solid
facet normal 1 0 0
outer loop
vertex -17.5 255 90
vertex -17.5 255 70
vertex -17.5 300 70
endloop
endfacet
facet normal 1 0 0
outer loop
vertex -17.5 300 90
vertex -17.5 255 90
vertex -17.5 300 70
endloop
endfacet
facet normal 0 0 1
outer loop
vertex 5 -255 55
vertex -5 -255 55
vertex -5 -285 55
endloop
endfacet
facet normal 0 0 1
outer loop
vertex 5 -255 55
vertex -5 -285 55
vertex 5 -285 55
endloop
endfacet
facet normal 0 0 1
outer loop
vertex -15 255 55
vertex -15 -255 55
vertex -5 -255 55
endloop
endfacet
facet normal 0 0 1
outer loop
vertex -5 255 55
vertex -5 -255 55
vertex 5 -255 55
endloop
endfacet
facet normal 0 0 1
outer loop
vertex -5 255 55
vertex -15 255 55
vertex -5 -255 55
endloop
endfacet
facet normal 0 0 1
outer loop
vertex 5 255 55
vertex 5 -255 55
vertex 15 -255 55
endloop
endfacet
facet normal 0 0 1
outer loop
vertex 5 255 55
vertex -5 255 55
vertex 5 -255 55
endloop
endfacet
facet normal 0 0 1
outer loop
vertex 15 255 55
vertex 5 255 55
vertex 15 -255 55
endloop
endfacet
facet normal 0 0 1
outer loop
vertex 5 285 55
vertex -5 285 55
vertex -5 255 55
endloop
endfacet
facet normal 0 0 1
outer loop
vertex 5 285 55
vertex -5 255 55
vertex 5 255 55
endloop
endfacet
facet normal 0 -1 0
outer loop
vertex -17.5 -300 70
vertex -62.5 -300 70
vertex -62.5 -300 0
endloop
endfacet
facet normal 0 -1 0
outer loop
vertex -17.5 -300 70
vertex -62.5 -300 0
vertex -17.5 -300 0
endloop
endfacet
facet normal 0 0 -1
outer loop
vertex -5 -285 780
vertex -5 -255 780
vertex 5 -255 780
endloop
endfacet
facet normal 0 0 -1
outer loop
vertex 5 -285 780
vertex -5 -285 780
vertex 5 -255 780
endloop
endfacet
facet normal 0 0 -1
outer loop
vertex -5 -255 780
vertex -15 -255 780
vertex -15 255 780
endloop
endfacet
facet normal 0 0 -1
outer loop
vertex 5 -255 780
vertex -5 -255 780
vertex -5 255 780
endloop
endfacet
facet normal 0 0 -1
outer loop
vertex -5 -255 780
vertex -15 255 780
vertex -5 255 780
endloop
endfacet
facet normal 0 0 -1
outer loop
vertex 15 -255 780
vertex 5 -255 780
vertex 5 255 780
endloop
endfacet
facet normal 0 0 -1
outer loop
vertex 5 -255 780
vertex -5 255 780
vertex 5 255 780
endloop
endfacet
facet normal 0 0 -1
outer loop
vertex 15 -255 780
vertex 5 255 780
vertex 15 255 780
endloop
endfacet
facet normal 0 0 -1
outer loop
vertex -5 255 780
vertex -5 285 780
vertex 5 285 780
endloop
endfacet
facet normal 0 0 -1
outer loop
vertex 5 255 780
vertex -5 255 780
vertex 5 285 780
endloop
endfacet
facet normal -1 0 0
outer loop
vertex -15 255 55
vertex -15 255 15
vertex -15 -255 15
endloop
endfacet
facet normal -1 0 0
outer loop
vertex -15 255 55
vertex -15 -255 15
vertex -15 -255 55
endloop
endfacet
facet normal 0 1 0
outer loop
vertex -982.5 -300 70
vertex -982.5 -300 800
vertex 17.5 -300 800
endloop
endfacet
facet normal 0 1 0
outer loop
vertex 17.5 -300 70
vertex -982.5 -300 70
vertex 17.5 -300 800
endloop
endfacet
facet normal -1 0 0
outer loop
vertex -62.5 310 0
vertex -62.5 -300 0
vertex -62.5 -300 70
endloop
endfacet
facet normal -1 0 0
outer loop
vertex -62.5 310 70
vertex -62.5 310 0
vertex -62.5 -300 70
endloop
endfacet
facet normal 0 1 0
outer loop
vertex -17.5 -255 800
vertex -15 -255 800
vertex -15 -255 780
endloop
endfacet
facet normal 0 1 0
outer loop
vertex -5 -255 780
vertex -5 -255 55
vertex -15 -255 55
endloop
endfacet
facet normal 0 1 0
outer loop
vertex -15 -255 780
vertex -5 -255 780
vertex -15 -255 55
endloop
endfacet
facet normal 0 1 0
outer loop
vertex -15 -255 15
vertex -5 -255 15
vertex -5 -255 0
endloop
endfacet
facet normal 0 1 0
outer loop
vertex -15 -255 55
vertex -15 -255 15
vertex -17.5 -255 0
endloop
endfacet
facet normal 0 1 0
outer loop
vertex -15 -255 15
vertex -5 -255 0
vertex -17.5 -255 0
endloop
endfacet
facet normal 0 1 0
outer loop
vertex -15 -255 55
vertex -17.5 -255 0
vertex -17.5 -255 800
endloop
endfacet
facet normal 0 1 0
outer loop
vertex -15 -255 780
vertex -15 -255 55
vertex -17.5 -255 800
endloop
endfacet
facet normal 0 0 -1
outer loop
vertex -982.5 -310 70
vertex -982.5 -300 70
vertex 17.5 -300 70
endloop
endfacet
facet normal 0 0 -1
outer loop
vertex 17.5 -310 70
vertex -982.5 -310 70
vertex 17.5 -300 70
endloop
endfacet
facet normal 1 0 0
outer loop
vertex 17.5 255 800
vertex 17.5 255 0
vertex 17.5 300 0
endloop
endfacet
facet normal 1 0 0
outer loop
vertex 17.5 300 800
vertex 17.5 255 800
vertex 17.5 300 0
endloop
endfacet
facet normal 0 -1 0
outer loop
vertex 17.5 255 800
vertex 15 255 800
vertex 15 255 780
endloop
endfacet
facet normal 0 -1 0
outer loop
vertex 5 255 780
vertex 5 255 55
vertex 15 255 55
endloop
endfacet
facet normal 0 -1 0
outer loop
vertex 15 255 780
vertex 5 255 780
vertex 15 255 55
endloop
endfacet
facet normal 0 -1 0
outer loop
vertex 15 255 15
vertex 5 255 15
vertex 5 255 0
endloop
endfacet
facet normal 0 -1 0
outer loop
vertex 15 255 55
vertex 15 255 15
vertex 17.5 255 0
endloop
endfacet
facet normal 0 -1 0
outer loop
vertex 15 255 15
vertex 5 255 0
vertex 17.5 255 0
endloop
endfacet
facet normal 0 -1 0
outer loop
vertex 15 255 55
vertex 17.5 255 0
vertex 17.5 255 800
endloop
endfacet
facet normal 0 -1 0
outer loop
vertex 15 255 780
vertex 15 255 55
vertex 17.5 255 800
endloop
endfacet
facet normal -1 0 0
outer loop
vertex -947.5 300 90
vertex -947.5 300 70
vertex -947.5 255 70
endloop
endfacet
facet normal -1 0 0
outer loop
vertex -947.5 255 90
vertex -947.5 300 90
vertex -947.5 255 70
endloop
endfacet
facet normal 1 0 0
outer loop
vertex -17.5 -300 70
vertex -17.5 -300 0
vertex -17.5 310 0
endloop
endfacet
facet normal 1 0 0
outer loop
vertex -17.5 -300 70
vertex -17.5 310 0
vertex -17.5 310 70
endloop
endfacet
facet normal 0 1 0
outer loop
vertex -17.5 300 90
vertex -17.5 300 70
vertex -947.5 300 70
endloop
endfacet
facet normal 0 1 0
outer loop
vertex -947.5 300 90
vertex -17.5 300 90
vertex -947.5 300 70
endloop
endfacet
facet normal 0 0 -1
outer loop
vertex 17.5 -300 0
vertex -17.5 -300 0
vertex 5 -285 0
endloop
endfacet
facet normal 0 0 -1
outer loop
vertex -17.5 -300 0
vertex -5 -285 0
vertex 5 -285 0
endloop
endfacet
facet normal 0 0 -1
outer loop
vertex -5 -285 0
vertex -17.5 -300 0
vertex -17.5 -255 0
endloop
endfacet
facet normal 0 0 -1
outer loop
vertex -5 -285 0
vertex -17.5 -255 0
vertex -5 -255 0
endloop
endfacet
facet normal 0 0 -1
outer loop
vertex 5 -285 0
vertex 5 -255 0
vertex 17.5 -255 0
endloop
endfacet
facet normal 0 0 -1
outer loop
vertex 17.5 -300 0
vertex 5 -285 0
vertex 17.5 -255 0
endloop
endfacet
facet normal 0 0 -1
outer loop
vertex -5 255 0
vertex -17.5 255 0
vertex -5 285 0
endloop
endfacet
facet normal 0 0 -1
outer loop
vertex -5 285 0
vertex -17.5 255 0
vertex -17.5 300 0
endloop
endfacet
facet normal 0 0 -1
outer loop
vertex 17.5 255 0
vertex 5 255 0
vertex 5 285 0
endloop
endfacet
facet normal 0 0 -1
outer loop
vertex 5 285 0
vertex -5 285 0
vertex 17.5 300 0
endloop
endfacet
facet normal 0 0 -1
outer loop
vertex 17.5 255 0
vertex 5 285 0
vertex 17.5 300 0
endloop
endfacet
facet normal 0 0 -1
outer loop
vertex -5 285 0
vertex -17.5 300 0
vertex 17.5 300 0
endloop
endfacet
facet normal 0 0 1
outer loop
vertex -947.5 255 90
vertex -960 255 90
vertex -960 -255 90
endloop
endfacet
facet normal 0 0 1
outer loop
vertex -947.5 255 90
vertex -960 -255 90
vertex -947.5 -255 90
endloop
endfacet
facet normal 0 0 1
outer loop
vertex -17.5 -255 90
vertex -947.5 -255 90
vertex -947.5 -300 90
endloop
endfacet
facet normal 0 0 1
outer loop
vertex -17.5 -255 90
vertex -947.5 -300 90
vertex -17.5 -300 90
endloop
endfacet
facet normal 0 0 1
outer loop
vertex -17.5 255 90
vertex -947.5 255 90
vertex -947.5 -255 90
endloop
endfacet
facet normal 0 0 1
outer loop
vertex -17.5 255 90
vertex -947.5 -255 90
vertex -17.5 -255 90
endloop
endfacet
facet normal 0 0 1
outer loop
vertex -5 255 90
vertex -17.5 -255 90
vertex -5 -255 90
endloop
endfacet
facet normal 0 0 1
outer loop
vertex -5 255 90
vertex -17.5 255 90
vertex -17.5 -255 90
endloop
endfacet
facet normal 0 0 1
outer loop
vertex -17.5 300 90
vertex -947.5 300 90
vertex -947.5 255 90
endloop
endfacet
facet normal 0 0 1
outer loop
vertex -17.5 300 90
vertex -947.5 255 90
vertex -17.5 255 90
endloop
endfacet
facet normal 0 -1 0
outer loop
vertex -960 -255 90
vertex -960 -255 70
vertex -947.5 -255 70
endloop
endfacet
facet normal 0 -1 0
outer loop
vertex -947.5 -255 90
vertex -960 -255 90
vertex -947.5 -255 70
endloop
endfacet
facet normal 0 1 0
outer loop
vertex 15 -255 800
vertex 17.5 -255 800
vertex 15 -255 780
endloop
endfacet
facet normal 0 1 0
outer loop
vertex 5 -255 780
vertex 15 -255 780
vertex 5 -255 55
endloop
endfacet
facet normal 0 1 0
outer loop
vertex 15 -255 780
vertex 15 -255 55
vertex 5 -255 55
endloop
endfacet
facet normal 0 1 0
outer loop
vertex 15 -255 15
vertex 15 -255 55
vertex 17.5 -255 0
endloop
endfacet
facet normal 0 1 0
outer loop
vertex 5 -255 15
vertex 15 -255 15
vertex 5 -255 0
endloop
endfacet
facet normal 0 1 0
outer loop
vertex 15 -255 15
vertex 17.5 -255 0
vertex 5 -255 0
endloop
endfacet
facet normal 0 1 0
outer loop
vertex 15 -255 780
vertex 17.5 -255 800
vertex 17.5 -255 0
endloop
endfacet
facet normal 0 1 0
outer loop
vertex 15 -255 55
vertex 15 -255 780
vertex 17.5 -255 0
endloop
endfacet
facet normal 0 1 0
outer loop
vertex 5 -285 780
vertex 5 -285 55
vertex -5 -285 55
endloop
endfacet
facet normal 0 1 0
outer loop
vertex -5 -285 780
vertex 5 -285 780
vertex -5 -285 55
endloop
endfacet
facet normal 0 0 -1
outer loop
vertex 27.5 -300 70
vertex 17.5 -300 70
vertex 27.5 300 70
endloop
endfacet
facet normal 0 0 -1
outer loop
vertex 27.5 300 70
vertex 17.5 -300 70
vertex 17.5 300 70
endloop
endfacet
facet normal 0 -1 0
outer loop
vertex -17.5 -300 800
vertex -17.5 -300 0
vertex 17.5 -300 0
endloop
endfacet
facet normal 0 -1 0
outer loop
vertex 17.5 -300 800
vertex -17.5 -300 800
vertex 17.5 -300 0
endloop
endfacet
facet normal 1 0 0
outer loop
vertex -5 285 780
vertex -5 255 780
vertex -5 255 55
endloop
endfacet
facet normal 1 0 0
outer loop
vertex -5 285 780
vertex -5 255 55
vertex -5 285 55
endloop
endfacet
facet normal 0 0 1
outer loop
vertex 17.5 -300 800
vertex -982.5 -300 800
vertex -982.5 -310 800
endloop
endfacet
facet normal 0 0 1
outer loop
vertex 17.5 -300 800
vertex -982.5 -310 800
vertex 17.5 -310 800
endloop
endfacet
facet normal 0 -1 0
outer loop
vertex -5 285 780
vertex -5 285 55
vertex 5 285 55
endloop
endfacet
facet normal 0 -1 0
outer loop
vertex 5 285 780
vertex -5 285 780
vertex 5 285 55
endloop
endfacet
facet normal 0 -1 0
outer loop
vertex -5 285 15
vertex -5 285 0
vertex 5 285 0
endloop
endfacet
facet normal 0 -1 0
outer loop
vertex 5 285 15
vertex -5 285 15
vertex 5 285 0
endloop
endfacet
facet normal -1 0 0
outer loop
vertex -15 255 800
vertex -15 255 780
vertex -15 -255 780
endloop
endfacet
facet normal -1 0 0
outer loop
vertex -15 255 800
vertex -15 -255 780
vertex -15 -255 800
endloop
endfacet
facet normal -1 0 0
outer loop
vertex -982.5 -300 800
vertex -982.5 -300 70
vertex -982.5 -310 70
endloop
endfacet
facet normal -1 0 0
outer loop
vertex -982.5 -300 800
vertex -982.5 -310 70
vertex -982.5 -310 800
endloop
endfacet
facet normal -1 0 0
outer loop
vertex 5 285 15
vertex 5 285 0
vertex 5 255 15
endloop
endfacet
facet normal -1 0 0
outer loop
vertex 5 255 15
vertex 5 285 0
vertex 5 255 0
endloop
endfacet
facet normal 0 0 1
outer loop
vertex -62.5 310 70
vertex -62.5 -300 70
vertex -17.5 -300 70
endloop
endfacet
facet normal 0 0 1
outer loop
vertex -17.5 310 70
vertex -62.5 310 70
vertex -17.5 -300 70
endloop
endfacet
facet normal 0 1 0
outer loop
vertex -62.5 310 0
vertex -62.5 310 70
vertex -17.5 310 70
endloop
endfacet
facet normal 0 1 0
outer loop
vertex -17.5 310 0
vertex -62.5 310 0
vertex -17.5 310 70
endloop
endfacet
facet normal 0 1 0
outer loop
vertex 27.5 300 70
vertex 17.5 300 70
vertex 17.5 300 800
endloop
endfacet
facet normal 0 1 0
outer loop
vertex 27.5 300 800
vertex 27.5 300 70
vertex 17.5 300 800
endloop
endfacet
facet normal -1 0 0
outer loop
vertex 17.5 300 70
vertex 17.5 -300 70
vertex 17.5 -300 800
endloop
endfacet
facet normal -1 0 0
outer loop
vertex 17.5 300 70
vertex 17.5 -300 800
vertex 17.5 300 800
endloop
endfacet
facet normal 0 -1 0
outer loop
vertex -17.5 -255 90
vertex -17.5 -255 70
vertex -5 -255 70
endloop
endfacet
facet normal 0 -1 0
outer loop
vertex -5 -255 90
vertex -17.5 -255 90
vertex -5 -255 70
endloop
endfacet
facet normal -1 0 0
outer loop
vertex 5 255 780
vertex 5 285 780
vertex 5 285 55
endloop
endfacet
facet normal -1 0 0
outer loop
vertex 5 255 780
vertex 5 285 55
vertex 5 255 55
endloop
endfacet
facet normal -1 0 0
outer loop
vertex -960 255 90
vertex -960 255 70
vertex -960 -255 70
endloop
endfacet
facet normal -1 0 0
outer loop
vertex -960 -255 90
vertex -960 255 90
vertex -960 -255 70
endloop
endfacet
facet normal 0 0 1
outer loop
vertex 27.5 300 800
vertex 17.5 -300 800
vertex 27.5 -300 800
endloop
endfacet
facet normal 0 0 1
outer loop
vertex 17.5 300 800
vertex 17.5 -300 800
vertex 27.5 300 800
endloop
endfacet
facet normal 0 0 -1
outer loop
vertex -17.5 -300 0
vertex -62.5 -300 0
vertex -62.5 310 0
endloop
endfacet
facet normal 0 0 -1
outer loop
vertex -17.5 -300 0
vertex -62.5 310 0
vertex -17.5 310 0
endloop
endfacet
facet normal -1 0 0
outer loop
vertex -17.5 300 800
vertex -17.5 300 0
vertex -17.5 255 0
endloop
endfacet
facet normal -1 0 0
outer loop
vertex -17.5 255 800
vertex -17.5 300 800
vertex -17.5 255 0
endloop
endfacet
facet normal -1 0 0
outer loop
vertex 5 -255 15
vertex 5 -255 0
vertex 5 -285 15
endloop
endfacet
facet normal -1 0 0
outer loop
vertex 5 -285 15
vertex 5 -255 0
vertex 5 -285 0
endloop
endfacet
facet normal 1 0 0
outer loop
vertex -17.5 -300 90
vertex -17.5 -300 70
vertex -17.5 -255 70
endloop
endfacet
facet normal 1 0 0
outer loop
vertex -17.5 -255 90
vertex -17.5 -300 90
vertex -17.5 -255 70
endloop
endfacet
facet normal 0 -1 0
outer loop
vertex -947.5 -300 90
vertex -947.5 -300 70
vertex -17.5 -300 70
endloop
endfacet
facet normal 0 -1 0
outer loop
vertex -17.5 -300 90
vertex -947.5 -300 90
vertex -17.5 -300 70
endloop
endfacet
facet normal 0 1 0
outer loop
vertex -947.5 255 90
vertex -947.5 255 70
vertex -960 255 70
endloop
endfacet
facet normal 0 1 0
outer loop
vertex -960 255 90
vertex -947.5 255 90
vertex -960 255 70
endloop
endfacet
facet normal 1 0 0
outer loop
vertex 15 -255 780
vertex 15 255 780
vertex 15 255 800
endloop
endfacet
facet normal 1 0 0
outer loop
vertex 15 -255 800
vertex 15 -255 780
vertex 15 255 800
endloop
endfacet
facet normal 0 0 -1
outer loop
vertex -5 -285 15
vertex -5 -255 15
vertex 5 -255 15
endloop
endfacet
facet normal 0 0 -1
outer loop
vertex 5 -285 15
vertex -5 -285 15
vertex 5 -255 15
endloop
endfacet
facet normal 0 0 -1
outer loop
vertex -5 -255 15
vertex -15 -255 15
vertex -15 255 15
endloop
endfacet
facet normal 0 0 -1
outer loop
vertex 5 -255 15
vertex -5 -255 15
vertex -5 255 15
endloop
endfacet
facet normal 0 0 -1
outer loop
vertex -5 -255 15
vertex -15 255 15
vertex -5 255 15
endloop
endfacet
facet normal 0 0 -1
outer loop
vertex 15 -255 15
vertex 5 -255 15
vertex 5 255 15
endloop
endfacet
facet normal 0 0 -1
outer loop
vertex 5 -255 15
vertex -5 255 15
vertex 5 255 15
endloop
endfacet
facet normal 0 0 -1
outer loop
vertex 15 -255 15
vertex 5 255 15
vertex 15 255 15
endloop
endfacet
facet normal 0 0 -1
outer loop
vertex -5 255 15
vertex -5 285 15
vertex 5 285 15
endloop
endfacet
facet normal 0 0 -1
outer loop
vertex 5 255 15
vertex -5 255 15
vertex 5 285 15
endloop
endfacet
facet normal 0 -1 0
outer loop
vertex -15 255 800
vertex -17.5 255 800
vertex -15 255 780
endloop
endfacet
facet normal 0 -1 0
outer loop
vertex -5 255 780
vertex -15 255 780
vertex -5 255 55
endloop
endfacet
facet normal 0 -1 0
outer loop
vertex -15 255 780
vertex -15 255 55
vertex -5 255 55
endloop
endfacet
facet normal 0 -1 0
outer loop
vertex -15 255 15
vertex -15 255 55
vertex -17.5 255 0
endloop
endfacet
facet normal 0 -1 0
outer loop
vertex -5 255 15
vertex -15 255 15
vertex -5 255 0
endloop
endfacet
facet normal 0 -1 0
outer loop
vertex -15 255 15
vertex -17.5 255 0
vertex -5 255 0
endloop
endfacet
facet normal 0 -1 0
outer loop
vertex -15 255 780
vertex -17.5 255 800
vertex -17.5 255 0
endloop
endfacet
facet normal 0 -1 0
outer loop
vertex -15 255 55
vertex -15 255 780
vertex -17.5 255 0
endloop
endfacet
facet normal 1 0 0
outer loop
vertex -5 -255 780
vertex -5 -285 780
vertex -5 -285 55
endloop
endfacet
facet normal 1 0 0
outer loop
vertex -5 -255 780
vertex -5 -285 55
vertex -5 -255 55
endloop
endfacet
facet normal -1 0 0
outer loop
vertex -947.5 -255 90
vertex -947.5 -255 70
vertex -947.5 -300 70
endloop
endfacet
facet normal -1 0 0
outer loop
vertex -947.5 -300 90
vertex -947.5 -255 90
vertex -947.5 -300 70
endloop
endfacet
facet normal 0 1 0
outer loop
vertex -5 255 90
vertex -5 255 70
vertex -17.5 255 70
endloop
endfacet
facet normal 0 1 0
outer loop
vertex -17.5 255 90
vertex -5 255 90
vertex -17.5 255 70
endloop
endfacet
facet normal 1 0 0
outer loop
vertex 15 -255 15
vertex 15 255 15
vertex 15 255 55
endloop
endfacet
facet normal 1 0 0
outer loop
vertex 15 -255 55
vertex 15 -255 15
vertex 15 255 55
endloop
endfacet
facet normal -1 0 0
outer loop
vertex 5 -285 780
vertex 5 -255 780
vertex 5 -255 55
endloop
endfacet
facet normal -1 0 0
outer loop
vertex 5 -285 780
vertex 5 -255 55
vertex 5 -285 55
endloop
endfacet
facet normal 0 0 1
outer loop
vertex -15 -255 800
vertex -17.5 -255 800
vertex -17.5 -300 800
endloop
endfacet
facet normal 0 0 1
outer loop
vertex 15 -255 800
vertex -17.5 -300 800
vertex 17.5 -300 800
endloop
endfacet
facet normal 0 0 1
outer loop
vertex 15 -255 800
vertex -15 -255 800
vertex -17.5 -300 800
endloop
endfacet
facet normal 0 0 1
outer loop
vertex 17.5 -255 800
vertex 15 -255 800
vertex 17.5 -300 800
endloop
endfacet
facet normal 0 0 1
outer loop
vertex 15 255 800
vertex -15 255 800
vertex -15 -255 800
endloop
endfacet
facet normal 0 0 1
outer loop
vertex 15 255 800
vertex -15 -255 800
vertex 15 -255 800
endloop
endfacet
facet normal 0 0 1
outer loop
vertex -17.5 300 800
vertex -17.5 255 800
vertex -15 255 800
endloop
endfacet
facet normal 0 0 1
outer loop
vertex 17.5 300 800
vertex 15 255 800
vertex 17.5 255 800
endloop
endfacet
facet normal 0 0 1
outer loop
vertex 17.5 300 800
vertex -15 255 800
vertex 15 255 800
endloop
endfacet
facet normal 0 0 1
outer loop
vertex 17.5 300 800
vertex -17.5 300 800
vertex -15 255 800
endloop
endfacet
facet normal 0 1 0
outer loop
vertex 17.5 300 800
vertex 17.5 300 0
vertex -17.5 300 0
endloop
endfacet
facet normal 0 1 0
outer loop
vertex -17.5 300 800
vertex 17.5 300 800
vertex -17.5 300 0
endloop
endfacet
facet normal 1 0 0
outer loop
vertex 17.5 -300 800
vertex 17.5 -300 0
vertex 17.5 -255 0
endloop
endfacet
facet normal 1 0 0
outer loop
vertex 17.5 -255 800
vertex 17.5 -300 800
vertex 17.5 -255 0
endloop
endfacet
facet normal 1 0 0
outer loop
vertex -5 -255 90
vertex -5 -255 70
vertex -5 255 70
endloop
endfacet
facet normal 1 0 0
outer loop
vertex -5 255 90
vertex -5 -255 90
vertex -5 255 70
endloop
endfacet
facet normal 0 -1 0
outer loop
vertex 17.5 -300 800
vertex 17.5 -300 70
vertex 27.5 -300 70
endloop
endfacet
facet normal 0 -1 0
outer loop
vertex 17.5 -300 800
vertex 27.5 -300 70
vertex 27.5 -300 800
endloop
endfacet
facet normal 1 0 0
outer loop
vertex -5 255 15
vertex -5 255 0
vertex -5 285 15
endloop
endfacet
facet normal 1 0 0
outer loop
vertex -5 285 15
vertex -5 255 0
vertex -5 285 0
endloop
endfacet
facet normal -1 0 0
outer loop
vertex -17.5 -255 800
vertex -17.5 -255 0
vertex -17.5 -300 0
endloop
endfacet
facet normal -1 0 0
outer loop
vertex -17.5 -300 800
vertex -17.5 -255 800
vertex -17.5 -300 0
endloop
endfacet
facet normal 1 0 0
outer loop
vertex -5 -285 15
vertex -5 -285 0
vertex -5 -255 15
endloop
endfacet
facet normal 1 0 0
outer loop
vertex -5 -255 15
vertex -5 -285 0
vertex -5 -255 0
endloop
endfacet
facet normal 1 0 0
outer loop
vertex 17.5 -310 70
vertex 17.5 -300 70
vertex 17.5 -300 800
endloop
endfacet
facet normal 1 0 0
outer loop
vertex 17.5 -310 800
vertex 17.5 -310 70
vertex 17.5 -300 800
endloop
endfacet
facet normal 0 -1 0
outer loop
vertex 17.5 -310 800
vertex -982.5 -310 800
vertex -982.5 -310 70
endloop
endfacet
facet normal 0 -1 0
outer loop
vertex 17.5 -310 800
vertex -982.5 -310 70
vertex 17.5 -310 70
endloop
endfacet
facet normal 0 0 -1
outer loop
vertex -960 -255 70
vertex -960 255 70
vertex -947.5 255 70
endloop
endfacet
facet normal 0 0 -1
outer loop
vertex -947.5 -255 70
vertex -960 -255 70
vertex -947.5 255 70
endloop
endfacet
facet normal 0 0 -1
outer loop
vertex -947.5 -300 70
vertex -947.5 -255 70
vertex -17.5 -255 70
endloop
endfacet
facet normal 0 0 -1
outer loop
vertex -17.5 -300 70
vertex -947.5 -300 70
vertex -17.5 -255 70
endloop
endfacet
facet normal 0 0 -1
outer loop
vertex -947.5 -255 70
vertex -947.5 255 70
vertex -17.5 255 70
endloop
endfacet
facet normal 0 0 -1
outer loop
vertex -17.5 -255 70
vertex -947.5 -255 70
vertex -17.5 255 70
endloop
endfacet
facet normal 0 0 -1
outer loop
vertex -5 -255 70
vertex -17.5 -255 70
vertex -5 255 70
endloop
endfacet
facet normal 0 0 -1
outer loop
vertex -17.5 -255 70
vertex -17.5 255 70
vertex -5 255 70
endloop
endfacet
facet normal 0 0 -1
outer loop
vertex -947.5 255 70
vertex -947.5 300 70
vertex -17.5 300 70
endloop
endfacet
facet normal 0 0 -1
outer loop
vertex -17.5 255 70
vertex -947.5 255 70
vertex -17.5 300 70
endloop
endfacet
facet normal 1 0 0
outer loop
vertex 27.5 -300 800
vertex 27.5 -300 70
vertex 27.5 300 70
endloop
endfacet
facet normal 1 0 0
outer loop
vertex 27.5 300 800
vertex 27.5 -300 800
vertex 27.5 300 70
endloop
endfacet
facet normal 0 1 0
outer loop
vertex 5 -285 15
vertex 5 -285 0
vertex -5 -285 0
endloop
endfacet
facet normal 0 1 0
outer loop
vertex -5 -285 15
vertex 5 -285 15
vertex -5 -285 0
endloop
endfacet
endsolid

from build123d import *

# Parameters (mm, degrees)
F1_DEPTH  = 800
F2_W      = 30
F2_H      = 20
F2_H_2    = 40
F3_DEPTH  = 570
F4_W      = 45
F4_H      = 70
F5_DEPTH  = 610
F6_W      = 1000
F6_H      = 730
F7_DEPTH  = 10
F8_W      = 600
F8_H      = 730
F9_DEPTH  = 10
F11_DEPTH = 20


with BuildPart() as f1:
    # F0 (on Top) → F1 (new body)
    with BuildSketch(Plane.XY):
        Polygon((17.5, 300), (-17.5, 300), (-17.5, 255), (-5, 255), (-5, 285), (5, 285), (5, 255), (17.5, 255), align=None)
        Polygon((-5, -255), (-17.5, -255), (-17.5, -300), (17.5, -300), (17.5, -255), (5, -255), (5, -285), (-5, -285), align=None)
    extrude(amount=F1_DEPTH)

    # F2 (on face) → F3 (join, through all)
    with BuildSketch(Plane.XZ.offset(-285)):
        with Locations((0, 790)):
            Rectangle(F2_W, F2_H)
        with Locations((0, 35)):
            Rectangle(F2_W, F2_H_2)
    extrude(amount=F3_DEPTH)


with BuildPart() as f5:
    # F4 (on face) → F5 (new body)
    with BuildSketch(Plane.XZ.offset(300)):
        with Locations((-40, 35)):
            Rectangle(F4_W, F4_H)
    extrude(amount=-F5_DEPTH)


with BuildPart() as f7:
    # F6 (on face) → F7 (new body)
    with BuildSketch(Plane.XZ.offset(300)):
        with Locations((-482.5, 435)):
            Rectangle(F6_W, F6_H)
    extrude(amount=F7_DEPTH)


with BuildPart() as f9:
    # F8 (on face) → F9 (new body)
    with BuildSketch(Plane.YZ.offset(17.5)):
        with Locations((0, 435)):
            Rectangle(F8_W, F8_H)
    extrude(amount=F9_DEPTH)


with BuildPart() as f11:
    # F10 (on face) → F11 (new body)
    with BuildSketch(Plane.XY.offset(70)):
        Polygon((-17.5, -255), (-5, -255), (-5, 255), (-17.5, 255), (-17.5, 300), (-947.5, 300), (-947.5, 255), (-960, 255), (-960, -255), (-947.5, -255), (-947.5, -300), (-17.5, -300), align=None)
    extrude(amount=F11_DEPTH)


solid = Compound([f1.part, f5.part, f7.part, f9.part, f11.part])
